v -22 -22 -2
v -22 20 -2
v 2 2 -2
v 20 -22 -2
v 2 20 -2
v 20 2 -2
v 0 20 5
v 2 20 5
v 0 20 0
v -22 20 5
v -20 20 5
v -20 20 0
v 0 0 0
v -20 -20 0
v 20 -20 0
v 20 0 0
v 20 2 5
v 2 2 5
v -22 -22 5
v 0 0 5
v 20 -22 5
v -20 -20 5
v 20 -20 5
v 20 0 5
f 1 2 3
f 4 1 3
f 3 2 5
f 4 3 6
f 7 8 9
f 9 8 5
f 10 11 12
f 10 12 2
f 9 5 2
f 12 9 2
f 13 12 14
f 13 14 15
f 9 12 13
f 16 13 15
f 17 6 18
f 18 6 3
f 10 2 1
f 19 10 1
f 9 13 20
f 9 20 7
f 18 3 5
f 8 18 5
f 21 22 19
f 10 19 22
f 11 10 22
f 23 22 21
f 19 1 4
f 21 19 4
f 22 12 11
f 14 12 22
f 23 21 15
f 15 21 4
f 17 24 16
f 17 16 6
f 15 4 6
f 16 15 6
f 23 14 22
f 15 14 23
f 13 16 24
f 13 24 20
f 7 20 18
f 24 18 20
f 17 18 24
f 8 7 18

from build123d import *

# Parameters (mm, degrees)
F1_DEPTH = 5
F2_T     = 2


with BuildPart() as f1:
    # F0 (on Top) → F1 (new body)
    with BuildSketch(Plane.XY):
        Polygon((0, 20), (-20, 20), (-20, -20), (20, -20), (20, 0), (0, 0), align=None)
    extrude(amount=F1_DEPTH)

    # F2
    f2_openings = [f1.faces().sort_by_distance(p)[0] for p in [
        (-3.333333, -3.333333, 5),
        (20, -10, 2.5),
        (-10, 20, 2.5),
    ]]
    offset(amount=F2_T, openings=f2_openings, kind=Kind.INTERSECTION)


solid = f1.part
